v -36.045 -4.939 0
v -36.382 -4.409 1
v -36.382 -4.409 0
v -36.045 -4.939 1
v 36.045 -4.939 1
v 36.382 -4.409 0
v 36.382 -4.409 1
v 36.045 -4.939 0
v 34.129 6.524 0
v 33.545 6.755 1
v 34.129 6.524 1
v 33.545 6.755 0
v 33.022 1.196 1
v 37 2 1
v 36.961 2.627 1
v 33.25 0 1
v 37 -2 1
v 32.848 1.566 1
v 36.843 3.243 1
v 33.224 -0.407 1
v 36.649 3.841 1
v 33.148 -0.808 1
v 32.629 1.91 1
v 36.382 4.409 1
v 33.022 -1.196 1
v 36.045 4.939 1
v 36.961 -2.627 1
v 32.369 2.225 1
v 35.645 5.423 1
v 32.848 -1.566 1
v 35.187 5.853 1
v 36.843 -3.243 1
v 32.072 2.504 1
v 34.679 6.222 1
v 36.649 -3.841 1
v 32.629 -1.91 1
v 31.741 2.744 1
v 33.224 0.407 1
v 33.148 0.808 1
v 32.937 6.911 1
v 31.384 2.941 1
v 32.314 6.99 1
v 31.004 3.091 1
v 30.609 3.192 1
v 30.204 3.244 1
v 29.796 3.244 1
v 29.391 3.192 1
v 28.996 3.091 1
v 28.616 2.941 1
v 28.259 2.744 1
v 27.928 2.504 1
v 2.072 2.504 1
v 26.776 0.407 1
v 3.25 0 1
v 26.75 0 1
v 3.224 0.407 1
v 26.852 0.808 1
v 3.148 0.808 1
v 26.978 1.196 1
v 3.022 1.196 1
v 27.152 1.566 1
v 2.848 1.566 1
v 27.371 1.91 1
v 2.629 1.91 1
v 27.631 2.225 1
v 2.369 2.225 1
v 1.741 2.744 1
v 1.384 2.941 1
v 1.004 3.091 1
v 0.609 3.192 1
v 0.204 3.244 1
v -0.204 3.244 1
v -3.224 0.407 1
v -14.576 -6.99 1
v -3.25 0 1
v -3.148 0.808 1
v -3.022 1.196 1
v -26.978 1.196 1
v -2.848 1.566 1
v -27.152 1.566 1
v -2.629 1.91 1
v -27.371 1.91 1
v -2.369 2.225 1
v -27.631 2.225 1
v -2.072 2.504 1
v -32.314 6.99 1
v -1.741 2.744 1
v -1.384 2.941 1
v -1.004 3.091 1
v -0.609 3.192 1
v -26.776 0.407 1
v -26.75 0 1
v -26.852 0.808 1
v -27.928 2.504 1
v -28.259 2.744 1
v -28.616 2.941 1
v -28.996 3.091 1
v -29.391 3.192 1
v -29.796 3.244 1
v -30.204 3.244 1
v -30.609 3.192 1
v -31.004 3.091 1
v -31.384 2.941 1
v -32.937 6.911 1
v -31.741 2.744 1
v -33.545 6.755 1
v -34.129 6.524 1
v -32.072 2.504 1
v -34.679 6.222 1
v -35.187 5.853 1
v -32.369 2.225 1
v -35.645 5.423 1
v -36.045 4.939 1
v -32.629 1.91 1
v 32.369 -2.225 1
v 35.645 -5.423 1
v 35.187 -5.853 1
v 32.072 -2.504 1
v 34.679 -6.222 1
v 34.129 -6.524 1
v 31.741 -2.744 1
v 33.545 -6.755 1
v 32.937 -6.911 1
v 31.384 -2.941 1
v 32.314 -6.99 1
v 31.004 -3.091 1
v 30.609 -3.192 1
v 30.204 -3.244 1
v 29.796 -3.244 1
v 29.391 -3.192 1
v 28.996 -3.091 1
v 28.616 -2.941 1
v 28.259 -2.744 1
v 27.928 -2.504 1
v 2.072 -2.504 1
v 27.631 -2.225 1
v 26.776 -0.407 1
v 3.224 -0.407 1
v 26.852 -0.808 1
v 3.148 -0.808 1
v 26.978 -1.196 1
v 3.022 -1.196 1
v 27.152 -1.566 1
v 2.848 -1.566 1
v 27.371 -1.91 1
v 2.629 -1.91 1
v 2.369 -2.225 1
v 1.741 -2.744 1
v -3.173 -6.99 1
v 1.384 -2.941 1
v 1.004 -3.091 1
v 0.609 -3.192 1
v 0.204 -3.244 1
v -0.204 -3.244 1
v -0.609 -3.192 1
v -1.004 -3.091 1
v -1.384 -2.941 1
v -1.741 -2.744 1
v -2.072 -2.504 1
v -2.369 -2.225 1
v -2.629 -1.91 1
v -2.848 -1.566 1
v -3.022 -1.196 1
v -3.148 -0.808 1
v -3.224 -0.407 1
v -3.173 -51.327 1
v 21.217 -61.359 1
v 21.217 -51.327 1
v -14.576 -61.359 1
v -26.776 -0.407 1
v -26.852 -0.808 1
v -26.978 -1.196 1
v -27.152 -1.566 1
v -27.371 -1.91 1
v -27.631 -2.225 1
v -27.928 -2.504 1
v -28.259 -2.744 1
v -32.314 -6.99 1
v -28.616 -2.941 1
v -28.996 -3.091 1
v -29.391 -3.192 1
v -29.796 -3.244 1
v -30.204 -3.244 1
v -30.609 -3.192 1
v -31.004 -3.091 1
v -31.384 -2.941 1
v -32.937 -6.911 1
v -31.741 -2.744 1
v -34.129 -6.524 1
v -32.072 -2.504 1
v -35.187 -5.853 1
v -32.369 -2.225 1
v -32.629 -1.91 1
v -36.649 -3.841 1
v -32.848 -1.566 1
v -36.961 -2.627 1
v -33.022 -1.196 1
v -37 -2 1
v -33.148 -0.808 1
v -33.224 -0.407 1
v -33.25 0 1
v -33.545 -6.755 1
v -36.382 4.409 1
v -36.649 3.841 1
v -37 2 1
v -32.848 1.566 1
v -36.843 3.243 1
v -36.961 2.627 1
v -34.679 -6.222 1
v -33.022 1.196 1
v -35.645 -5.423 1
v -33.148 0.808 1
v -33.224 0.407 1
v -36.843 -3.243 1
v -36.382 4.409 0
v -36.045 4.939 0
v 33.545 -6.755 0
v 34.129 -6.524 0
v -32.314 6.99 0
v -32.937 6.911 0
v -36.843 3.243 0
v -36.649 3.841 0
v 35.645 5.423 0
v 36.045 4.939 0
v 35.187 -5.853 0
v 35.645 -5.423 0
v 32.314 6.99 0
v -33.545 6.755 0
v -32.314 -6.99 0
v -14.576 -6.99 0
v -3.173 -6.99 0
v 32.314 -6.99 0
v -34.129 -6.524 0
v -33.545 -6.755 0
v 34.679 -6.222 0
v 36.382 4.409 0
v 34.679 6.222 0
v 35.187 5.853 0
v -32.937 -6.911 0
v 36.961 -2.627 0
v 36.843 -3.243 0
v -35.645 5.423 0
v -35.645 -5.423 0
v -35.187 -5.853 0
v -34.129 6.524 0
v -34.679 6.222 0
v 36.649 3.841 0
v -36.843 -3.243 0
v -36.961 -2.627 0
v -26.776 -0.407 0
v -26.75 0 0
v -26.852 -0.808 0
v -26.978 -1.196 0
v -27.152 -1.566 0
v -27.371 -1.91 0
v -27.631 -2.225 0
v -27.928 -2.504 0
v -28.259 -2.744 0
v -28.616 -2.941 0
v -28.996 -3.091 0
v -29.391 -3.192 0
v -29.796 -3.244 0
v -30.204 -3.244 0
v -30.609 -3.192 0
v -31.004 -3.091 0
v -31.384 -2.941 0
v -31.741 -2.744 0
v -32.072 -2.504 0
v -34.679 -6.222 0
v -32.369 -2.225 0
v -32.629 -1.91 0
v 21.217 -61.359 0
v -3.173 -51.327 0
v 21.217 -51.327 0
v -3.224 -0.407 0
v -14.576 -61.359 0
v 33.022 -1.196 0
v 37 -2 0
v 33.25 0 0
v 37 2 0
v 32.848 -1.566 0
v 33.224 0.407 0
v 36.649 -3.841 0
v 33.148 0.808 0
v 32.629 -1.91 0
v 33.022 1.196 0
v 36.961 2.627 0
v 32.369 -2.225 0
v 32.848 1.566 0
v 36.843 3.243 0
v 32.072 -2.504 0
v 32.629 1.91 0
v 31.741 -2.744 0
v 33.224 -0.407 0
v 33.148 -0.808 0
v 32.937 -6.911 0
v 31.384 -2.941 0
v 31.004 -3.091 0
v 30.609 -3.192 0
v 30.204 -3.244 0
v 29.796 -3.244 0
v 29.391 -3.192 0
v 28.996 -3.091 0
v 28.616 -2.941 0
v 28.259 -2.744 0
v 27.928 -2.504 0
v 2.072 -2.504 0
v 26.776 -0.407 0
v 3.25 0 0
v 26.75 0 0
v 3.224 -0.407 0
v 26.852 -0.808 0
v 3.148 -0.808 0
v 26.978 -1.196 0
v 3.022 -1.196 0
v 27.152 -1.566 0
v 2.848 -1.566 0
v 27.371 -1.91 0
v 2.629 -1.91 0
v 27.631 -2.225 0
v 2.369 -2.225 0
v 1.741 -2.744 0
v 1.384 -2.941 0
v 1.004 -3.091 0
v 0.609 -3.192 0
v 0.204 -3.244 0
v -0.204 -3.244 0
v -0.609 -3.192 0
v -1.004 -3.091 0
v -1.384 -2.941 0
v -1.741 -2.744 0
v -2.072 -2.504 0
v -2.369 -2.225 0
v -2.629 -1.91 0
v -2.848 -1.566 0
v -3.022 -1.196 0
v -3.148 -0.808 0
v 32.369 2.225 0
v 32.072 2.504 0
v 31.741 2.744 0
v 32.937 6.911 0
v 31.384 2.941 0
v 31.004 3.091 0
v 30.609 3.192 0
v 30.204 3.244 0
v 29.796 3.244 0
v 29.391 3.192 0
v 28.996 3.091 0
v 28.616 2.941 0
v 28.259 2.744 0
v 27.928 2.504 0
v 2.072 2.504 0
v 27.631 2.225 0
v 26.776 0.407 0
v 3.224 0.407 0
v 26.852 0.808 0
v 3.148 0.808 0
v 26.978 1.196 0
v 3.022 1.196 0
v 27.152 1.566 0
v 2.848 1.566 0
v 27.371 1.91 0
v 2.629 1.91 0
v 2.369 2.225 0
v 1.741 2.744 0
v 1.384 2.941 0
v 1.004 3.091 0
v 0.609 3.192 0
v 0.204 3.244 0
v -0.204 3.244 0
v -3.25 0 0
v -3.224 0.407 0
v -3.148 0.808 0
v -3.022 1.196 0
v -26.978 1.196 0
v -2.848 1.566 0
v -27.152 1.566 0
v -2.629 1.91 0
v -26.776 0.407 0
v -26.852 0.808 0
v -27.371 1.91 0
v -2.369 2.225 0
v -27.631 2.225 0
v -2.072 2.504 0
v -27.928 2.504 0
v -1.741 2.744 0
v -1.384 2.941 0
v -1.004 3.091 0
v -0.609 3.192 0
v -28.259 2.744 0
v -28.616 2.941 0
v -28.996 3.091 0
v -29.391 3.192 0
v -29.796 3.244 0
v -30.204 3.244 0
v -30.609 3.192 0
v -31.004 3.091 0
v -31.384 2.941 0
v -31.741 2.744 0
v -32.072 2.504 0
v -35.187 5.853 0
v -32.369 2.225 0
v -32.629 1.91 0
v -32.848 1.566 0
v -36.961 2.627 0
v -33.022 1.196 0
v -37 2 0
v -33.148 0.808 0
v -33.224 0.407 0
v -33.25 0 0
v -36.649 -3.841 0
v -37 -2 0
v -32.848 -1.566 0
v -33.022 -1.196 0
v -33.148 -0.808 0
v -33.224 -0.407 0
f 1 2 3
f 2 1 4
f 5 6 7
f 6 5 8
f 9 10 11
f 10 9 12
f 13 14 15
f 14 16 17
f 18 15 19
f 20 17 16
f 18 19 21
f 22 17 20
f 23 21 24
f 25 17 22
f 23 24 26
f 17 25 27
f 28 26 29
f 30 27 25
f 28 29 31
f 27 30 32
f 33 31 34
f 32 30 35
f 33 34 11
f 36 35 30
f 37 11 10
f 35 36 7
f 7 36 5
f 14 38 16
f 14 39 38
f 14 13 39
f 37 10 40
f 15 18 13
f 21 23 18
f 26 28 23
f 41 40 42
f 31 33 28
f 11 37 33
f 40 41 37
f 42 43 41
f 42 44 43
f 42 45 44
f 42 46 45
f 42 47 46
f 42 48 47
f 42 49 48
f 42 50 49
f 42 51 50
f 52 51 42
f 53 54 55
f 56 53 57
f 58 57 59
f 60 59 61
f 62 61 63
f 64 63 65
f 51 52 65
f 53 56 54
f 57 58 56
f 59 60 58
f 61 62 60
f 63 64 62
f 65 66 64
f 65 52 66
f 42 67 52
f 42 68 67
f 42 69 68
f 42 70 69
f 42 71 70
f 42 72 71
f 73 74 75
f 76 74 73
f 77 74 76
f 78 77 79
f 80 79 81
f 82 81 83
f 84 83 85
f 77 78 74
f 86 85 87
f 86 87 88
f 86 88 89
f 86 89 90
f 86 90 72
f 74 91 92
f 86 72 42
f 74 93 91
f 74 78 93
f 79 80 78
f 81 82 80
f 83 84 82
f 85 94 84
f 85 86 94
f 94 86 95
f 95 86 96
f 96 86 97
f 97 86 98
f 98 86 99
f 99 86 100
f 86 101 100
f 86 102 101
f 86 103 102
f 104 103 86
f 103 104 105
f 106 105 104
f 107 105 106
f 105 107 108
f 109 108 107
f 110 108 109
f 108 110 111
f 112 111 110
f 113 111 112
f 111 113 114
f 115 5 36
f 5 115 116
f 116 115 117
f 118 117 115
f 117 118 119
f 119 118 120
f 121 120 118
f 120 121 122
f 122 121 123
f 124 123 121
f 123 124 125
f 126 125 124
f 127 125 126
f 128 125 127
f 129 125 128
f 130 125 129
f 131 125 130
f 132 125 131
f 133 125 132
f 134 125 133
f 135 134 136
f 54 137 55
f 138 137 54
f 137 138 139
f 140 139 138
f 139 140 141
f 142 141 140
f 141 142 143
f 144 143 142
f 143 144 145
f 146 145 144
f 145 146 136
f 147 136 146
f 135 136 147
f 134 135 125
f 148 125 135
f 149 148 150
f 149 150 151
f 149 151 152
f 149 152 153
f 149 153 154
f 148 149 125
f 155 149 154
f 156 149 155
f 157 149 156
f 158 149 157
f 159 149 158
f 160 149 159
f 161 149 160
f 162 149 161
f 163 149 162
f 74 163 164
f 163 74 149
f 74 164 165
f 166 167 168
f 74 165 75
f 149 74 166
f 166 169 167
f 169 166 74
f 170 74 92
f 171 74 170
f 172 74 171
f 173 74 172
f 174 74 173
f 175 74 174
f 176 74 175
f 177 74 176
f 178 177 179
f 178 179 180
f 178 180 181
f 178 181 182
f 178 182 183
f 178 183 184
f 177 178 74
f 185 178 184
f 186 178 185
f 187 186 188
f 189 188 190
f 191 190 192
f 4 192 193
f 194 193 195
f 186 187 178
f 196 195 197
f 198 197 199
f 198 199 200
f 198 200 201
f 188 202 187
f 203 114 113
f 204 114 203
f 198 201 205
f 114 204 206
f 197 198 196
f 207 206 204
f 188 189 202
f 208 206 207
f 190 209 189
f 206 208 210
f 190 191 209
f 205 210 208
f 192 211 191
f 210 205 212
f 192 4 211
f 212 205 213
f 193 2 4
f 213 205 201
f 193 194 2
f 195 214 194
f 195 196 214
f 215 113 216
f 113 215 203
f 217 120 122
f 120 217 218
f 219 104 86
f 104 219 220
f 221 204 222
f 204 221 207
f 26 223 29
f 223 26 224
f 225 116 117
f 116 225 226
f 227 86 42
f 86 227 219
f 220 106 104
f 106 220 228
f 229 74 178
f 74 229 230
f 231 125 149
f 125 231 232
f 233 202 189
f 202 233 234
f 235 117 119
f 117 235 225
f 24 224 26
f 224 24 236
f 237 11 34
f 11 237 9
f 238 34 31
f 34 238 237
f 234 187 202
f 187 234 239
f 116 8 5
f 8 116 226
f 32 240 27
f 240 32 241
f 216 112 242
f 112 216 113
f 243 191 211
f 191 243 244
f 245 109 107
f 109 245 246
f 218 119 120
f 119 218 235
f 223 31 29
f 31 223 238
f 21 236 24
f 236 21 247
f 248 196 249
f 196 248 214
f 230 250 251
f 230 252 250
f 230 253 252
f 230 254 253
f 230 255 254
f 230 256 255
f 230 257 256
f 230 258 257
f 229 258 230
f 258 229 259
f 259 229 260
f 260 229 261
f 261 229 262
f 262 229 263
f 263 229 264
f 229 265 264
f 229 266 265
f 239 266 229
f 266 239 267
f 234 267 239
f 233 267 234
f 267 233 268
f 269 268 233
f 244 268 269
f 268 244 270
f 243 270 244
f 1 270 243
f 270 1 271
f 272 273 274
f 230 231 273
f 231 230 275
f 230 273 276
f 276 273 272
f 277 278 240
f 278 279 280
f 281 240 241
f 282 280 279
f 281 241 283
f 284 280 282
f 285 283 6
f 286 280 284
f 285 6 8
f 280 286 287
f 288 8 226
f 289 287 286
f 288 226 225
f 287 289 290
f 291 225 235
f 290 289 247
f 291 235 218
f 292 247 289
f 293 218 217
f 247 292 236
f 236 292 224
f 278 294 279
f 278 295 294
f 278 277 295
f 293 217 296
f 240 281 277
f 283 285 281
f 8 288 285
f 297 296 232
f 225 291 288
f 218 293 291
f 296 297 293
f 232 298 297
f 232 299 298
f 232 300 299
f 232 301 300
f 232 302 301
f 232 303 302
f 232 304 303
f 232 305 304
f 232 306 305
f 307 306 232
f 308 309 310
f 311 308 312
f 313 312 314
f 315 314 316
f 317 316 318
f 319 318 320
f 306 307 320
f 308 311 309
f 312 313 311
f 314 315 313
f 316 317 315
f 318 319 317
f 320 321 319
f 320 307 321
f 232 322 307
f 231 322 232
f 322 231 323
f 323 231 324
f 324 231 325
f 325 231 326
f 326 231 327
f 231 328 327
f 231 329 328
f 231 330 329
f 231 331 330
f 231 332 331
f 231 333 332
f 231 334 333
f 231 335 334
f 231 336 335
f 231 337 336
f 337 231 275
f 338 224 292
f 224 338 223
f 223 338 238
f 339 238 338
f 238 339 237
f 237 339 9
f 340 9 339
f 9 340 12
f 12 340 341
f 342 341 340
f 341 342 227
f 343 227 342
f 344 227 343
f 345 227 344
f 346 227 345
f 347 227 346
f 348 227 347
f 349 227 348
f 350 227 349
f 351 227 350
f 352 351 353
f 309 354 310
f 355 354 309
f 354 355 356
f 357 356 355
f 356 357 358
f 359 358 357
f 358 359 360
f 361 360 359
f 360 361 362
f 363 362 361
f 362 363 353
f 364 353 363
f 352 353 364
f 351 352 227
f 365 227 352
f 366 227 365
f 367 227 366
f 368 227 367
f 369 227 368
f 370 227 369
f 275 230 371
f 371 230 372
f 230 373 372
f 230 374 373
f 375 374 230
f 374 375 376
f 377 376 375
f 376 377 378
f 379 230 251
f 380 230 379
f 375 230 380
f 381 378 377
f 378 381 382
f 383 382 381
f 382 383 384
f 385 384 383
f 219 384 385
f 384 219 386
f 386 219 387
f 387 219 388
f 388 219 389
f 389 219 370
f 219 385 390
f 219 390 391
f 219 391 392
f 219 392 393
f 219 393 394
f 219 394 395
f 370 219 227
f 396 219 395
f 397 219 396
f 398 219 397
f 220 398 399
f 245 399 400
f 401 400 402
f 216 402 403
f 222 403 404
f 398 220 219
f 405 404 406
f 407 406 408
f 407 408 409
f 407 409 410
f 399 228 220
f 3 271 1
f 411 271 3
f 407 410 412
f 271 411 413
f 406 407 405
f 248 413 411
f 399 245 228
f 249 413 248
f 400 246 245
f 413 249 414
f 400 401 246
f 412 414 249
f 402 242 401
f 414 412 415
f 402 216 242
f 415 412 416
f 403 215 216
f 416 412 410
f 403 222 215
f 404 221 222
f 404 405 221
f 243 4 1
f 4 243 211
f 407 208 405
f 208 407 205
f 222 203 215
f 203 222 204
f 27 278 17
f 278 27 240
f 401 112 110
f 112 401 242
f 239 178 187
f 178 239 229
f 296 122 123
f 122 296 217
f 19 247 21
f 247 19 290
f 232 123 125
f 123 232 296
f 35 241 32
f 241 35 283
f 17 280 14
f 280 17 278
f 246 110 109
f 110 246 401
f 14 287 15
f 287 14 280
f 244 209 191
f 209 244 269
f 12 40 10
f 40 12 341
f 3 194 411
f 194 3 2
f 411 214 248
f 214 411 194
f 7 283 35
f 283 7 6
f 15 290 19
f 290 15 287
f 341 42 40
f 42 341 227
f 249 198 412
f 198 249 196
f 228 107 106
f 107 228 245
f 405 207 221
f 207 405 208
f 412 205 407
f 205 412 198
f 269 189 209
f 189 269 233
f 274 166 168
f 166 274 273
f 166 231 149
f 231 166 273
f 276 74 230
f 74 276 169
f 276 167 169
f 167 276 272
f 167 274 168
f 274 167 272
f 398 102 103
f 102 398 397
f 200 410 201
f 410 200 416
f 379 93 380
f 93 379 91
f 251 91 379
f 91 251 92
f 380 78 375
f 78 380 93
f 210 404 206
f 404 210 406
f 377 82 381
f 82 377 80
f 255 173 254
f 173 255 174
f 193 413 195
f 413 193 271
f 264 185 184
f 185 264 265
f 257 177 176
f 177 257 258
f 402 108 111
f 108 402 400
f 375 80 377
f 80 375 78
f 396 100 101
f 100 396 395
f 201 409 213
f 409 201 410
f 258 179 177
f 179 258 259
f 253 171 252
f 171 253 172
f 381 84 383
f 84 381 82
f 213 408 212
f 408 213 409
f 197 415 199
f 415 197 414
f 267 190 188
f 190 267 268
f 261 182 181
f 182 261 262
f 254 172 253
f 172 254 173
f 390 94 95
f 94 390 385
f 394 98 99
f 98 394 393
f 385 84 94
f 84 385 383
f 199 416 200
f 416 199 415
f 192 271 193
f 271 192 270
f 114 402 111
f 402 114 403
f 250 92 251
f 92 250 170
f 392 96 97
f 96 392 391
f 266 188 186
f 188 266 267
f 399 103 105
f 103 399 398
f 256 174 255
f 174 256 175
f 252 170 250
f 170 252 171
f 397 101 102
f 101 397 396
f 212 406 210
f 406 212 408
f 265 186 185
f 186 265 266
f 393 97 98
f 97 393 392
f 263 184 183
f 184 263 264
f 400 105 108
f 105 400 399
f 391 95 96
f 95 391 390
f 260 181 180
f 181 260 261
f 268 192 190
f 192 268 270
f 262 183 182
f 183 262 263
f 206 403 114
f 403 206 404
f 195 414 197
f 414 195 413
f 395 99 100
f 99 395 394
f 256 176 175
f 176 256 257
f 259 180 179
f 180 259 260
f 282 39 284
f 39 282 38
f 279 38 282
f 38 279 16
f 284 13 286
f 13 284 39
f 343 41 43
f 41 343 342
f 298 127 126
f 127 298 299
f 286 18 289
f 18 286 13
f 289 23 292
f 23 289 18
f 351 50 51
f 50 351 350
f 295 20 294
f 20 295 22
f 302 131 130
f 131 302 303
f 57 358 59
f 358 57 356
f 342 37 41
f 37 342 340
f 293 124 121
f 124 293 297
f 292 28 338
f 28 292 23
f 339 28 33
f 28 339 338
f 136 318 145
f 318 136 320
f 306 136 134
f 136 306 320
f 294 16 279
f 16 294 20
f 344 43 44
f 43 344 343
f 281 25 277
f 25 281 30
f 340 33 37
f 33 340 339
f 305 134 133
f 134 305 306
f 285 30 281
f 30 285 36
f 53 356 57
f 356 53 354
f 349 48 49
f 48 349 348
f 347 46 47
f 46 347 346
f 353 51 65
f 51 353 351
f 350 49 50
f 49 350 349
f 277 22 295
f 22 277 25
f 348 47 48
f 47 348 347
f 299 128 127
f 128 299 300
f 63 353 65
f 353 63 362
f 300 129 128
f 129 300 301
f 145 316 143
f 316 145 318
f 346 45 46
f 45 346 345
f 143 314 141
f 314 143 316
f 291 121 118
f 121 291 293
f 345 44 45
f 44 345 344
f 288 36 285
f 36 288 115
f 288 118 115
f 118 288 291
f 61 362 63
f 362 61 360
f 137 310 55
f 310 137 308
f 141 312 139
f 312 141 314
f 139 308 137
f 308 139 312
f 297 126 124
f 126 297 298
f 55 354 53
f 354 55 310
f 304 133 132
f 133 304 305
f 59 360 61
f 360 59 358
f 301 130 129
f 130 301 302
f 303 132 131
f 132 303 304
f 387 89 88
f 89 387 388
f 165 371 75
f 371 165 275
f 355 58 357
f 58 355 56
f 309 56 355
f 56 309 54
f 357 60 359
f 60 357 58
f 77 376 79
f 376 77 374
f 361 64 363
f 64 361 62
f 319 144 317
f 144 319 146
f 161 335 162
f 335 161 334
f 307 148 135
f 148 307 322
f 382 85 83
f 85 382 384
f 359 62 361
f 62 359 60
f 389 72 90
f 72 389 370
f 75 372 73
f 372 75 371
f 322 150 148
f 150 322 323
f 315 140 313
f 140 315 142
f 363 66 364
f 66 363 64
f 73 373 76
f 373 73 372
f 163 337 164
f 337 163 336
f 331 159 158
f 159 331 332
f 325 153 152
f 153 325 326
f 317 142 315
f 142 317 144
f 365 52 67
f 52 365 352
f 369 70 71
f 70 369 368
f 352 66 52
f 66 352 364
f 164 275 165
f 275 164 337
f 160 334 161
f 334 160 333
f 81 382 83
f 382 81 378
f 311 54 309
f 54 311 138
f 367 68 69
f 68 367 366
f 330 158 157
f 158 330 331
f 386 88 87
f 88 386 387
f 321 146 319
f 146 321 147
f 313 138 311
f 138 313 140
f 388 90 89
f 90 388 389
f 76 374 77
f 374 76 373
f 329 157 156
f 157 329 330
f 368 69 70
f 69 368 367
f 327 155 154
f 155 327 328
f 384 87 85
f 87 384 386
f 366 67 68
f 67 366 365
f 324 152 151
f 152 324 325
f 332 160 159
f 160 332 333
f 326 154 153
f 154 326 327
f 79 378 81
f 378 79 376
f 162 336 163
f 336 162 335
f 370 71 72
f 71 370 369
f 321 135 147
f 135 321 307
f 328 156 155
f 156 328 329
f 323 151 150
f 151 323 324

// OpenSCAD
$fn = 50;


difference() {
	union() {
		translate(v = [0, 0, 0]) {
			rotate(a = [0, 0, 0]) {
				hull() {
					translate(v = [-32.0000000000, 2.0000000000, 0]) {
						rotate(a = [0, 0, 0]) {
							translate(v = [0, 0, 0]) {
								rotate(a = [0, 0, 0]) {
									cylinder(h = 1, r = 5);
								}
							}
						}
					}
					translate(v = [32.0000000000, 2.0000000000, 0]) {
						rotate(a = [0, 0, 0]) {
							translate(v = [0, 0, 0]) {
								rotate(a = [0, 0, 0]) {
									cylinder(h = 1, r = 5);
								}
							}
						}
					}
					translate(v = [-32.0000000000, -2.0000000000, 0]) {
						rotate(a = [0, 0, 0]) {
							translate(v = [0, 0, 0]) {
								rotate(a = [0, 0, 0]) {
									cylinder(h = 1, r = 5);
								}
							}
						}
					}
					translate(v = [32.0000000000, -2.0000000000, 0]) {
						rotate(a = [0, 0, 0]) {
							translate(v = [0, 0, 0]) {
								rotate(a = [0, 0, 0]) {
									cylinder(h = 1, r = 5);
								}
							}
						}
					}
				}
			}
		}
		translate(v = [0, -5, 0]) {
			rotate(a = [0, 0, 0]) {
				linear_extrude(height = 1) {
					text(font = "DejaVu Sans Mono:style=Bold", halign = "center", size = 57.0000000000, text = "L", valign = "top");
				}
			}
		}
	}
	union() {
		translate(v = [-30.0000000000, 0.0000000000, -125.0000000000]) {
			rotate(a = [0, 0, 0]) {
				cylinder(h = 250, r = 3.2500000000);
			}
		}
		translate(v = [30.0000000000, 0.0000000000, -125.0000000000]) {
			rotate(a = [0, 0, 0]) {
				cylinder(h = 250, r = 3.2500000000);
			}
		}
		translate(v = [30.0000000000, 0.0000000000, -125.0000000000]) {
			rotate(a = [0, 0, 0]) {
				cylinder(h = 250, r = 3.2500000000);
			}
		}
		translate(v = [0, 0, -125.0000000000]) {
			rotate(a = [0, 0, 0]) {
				cylinder(h = 250, r = 3.2500000000);
			}
		}
	}
}
